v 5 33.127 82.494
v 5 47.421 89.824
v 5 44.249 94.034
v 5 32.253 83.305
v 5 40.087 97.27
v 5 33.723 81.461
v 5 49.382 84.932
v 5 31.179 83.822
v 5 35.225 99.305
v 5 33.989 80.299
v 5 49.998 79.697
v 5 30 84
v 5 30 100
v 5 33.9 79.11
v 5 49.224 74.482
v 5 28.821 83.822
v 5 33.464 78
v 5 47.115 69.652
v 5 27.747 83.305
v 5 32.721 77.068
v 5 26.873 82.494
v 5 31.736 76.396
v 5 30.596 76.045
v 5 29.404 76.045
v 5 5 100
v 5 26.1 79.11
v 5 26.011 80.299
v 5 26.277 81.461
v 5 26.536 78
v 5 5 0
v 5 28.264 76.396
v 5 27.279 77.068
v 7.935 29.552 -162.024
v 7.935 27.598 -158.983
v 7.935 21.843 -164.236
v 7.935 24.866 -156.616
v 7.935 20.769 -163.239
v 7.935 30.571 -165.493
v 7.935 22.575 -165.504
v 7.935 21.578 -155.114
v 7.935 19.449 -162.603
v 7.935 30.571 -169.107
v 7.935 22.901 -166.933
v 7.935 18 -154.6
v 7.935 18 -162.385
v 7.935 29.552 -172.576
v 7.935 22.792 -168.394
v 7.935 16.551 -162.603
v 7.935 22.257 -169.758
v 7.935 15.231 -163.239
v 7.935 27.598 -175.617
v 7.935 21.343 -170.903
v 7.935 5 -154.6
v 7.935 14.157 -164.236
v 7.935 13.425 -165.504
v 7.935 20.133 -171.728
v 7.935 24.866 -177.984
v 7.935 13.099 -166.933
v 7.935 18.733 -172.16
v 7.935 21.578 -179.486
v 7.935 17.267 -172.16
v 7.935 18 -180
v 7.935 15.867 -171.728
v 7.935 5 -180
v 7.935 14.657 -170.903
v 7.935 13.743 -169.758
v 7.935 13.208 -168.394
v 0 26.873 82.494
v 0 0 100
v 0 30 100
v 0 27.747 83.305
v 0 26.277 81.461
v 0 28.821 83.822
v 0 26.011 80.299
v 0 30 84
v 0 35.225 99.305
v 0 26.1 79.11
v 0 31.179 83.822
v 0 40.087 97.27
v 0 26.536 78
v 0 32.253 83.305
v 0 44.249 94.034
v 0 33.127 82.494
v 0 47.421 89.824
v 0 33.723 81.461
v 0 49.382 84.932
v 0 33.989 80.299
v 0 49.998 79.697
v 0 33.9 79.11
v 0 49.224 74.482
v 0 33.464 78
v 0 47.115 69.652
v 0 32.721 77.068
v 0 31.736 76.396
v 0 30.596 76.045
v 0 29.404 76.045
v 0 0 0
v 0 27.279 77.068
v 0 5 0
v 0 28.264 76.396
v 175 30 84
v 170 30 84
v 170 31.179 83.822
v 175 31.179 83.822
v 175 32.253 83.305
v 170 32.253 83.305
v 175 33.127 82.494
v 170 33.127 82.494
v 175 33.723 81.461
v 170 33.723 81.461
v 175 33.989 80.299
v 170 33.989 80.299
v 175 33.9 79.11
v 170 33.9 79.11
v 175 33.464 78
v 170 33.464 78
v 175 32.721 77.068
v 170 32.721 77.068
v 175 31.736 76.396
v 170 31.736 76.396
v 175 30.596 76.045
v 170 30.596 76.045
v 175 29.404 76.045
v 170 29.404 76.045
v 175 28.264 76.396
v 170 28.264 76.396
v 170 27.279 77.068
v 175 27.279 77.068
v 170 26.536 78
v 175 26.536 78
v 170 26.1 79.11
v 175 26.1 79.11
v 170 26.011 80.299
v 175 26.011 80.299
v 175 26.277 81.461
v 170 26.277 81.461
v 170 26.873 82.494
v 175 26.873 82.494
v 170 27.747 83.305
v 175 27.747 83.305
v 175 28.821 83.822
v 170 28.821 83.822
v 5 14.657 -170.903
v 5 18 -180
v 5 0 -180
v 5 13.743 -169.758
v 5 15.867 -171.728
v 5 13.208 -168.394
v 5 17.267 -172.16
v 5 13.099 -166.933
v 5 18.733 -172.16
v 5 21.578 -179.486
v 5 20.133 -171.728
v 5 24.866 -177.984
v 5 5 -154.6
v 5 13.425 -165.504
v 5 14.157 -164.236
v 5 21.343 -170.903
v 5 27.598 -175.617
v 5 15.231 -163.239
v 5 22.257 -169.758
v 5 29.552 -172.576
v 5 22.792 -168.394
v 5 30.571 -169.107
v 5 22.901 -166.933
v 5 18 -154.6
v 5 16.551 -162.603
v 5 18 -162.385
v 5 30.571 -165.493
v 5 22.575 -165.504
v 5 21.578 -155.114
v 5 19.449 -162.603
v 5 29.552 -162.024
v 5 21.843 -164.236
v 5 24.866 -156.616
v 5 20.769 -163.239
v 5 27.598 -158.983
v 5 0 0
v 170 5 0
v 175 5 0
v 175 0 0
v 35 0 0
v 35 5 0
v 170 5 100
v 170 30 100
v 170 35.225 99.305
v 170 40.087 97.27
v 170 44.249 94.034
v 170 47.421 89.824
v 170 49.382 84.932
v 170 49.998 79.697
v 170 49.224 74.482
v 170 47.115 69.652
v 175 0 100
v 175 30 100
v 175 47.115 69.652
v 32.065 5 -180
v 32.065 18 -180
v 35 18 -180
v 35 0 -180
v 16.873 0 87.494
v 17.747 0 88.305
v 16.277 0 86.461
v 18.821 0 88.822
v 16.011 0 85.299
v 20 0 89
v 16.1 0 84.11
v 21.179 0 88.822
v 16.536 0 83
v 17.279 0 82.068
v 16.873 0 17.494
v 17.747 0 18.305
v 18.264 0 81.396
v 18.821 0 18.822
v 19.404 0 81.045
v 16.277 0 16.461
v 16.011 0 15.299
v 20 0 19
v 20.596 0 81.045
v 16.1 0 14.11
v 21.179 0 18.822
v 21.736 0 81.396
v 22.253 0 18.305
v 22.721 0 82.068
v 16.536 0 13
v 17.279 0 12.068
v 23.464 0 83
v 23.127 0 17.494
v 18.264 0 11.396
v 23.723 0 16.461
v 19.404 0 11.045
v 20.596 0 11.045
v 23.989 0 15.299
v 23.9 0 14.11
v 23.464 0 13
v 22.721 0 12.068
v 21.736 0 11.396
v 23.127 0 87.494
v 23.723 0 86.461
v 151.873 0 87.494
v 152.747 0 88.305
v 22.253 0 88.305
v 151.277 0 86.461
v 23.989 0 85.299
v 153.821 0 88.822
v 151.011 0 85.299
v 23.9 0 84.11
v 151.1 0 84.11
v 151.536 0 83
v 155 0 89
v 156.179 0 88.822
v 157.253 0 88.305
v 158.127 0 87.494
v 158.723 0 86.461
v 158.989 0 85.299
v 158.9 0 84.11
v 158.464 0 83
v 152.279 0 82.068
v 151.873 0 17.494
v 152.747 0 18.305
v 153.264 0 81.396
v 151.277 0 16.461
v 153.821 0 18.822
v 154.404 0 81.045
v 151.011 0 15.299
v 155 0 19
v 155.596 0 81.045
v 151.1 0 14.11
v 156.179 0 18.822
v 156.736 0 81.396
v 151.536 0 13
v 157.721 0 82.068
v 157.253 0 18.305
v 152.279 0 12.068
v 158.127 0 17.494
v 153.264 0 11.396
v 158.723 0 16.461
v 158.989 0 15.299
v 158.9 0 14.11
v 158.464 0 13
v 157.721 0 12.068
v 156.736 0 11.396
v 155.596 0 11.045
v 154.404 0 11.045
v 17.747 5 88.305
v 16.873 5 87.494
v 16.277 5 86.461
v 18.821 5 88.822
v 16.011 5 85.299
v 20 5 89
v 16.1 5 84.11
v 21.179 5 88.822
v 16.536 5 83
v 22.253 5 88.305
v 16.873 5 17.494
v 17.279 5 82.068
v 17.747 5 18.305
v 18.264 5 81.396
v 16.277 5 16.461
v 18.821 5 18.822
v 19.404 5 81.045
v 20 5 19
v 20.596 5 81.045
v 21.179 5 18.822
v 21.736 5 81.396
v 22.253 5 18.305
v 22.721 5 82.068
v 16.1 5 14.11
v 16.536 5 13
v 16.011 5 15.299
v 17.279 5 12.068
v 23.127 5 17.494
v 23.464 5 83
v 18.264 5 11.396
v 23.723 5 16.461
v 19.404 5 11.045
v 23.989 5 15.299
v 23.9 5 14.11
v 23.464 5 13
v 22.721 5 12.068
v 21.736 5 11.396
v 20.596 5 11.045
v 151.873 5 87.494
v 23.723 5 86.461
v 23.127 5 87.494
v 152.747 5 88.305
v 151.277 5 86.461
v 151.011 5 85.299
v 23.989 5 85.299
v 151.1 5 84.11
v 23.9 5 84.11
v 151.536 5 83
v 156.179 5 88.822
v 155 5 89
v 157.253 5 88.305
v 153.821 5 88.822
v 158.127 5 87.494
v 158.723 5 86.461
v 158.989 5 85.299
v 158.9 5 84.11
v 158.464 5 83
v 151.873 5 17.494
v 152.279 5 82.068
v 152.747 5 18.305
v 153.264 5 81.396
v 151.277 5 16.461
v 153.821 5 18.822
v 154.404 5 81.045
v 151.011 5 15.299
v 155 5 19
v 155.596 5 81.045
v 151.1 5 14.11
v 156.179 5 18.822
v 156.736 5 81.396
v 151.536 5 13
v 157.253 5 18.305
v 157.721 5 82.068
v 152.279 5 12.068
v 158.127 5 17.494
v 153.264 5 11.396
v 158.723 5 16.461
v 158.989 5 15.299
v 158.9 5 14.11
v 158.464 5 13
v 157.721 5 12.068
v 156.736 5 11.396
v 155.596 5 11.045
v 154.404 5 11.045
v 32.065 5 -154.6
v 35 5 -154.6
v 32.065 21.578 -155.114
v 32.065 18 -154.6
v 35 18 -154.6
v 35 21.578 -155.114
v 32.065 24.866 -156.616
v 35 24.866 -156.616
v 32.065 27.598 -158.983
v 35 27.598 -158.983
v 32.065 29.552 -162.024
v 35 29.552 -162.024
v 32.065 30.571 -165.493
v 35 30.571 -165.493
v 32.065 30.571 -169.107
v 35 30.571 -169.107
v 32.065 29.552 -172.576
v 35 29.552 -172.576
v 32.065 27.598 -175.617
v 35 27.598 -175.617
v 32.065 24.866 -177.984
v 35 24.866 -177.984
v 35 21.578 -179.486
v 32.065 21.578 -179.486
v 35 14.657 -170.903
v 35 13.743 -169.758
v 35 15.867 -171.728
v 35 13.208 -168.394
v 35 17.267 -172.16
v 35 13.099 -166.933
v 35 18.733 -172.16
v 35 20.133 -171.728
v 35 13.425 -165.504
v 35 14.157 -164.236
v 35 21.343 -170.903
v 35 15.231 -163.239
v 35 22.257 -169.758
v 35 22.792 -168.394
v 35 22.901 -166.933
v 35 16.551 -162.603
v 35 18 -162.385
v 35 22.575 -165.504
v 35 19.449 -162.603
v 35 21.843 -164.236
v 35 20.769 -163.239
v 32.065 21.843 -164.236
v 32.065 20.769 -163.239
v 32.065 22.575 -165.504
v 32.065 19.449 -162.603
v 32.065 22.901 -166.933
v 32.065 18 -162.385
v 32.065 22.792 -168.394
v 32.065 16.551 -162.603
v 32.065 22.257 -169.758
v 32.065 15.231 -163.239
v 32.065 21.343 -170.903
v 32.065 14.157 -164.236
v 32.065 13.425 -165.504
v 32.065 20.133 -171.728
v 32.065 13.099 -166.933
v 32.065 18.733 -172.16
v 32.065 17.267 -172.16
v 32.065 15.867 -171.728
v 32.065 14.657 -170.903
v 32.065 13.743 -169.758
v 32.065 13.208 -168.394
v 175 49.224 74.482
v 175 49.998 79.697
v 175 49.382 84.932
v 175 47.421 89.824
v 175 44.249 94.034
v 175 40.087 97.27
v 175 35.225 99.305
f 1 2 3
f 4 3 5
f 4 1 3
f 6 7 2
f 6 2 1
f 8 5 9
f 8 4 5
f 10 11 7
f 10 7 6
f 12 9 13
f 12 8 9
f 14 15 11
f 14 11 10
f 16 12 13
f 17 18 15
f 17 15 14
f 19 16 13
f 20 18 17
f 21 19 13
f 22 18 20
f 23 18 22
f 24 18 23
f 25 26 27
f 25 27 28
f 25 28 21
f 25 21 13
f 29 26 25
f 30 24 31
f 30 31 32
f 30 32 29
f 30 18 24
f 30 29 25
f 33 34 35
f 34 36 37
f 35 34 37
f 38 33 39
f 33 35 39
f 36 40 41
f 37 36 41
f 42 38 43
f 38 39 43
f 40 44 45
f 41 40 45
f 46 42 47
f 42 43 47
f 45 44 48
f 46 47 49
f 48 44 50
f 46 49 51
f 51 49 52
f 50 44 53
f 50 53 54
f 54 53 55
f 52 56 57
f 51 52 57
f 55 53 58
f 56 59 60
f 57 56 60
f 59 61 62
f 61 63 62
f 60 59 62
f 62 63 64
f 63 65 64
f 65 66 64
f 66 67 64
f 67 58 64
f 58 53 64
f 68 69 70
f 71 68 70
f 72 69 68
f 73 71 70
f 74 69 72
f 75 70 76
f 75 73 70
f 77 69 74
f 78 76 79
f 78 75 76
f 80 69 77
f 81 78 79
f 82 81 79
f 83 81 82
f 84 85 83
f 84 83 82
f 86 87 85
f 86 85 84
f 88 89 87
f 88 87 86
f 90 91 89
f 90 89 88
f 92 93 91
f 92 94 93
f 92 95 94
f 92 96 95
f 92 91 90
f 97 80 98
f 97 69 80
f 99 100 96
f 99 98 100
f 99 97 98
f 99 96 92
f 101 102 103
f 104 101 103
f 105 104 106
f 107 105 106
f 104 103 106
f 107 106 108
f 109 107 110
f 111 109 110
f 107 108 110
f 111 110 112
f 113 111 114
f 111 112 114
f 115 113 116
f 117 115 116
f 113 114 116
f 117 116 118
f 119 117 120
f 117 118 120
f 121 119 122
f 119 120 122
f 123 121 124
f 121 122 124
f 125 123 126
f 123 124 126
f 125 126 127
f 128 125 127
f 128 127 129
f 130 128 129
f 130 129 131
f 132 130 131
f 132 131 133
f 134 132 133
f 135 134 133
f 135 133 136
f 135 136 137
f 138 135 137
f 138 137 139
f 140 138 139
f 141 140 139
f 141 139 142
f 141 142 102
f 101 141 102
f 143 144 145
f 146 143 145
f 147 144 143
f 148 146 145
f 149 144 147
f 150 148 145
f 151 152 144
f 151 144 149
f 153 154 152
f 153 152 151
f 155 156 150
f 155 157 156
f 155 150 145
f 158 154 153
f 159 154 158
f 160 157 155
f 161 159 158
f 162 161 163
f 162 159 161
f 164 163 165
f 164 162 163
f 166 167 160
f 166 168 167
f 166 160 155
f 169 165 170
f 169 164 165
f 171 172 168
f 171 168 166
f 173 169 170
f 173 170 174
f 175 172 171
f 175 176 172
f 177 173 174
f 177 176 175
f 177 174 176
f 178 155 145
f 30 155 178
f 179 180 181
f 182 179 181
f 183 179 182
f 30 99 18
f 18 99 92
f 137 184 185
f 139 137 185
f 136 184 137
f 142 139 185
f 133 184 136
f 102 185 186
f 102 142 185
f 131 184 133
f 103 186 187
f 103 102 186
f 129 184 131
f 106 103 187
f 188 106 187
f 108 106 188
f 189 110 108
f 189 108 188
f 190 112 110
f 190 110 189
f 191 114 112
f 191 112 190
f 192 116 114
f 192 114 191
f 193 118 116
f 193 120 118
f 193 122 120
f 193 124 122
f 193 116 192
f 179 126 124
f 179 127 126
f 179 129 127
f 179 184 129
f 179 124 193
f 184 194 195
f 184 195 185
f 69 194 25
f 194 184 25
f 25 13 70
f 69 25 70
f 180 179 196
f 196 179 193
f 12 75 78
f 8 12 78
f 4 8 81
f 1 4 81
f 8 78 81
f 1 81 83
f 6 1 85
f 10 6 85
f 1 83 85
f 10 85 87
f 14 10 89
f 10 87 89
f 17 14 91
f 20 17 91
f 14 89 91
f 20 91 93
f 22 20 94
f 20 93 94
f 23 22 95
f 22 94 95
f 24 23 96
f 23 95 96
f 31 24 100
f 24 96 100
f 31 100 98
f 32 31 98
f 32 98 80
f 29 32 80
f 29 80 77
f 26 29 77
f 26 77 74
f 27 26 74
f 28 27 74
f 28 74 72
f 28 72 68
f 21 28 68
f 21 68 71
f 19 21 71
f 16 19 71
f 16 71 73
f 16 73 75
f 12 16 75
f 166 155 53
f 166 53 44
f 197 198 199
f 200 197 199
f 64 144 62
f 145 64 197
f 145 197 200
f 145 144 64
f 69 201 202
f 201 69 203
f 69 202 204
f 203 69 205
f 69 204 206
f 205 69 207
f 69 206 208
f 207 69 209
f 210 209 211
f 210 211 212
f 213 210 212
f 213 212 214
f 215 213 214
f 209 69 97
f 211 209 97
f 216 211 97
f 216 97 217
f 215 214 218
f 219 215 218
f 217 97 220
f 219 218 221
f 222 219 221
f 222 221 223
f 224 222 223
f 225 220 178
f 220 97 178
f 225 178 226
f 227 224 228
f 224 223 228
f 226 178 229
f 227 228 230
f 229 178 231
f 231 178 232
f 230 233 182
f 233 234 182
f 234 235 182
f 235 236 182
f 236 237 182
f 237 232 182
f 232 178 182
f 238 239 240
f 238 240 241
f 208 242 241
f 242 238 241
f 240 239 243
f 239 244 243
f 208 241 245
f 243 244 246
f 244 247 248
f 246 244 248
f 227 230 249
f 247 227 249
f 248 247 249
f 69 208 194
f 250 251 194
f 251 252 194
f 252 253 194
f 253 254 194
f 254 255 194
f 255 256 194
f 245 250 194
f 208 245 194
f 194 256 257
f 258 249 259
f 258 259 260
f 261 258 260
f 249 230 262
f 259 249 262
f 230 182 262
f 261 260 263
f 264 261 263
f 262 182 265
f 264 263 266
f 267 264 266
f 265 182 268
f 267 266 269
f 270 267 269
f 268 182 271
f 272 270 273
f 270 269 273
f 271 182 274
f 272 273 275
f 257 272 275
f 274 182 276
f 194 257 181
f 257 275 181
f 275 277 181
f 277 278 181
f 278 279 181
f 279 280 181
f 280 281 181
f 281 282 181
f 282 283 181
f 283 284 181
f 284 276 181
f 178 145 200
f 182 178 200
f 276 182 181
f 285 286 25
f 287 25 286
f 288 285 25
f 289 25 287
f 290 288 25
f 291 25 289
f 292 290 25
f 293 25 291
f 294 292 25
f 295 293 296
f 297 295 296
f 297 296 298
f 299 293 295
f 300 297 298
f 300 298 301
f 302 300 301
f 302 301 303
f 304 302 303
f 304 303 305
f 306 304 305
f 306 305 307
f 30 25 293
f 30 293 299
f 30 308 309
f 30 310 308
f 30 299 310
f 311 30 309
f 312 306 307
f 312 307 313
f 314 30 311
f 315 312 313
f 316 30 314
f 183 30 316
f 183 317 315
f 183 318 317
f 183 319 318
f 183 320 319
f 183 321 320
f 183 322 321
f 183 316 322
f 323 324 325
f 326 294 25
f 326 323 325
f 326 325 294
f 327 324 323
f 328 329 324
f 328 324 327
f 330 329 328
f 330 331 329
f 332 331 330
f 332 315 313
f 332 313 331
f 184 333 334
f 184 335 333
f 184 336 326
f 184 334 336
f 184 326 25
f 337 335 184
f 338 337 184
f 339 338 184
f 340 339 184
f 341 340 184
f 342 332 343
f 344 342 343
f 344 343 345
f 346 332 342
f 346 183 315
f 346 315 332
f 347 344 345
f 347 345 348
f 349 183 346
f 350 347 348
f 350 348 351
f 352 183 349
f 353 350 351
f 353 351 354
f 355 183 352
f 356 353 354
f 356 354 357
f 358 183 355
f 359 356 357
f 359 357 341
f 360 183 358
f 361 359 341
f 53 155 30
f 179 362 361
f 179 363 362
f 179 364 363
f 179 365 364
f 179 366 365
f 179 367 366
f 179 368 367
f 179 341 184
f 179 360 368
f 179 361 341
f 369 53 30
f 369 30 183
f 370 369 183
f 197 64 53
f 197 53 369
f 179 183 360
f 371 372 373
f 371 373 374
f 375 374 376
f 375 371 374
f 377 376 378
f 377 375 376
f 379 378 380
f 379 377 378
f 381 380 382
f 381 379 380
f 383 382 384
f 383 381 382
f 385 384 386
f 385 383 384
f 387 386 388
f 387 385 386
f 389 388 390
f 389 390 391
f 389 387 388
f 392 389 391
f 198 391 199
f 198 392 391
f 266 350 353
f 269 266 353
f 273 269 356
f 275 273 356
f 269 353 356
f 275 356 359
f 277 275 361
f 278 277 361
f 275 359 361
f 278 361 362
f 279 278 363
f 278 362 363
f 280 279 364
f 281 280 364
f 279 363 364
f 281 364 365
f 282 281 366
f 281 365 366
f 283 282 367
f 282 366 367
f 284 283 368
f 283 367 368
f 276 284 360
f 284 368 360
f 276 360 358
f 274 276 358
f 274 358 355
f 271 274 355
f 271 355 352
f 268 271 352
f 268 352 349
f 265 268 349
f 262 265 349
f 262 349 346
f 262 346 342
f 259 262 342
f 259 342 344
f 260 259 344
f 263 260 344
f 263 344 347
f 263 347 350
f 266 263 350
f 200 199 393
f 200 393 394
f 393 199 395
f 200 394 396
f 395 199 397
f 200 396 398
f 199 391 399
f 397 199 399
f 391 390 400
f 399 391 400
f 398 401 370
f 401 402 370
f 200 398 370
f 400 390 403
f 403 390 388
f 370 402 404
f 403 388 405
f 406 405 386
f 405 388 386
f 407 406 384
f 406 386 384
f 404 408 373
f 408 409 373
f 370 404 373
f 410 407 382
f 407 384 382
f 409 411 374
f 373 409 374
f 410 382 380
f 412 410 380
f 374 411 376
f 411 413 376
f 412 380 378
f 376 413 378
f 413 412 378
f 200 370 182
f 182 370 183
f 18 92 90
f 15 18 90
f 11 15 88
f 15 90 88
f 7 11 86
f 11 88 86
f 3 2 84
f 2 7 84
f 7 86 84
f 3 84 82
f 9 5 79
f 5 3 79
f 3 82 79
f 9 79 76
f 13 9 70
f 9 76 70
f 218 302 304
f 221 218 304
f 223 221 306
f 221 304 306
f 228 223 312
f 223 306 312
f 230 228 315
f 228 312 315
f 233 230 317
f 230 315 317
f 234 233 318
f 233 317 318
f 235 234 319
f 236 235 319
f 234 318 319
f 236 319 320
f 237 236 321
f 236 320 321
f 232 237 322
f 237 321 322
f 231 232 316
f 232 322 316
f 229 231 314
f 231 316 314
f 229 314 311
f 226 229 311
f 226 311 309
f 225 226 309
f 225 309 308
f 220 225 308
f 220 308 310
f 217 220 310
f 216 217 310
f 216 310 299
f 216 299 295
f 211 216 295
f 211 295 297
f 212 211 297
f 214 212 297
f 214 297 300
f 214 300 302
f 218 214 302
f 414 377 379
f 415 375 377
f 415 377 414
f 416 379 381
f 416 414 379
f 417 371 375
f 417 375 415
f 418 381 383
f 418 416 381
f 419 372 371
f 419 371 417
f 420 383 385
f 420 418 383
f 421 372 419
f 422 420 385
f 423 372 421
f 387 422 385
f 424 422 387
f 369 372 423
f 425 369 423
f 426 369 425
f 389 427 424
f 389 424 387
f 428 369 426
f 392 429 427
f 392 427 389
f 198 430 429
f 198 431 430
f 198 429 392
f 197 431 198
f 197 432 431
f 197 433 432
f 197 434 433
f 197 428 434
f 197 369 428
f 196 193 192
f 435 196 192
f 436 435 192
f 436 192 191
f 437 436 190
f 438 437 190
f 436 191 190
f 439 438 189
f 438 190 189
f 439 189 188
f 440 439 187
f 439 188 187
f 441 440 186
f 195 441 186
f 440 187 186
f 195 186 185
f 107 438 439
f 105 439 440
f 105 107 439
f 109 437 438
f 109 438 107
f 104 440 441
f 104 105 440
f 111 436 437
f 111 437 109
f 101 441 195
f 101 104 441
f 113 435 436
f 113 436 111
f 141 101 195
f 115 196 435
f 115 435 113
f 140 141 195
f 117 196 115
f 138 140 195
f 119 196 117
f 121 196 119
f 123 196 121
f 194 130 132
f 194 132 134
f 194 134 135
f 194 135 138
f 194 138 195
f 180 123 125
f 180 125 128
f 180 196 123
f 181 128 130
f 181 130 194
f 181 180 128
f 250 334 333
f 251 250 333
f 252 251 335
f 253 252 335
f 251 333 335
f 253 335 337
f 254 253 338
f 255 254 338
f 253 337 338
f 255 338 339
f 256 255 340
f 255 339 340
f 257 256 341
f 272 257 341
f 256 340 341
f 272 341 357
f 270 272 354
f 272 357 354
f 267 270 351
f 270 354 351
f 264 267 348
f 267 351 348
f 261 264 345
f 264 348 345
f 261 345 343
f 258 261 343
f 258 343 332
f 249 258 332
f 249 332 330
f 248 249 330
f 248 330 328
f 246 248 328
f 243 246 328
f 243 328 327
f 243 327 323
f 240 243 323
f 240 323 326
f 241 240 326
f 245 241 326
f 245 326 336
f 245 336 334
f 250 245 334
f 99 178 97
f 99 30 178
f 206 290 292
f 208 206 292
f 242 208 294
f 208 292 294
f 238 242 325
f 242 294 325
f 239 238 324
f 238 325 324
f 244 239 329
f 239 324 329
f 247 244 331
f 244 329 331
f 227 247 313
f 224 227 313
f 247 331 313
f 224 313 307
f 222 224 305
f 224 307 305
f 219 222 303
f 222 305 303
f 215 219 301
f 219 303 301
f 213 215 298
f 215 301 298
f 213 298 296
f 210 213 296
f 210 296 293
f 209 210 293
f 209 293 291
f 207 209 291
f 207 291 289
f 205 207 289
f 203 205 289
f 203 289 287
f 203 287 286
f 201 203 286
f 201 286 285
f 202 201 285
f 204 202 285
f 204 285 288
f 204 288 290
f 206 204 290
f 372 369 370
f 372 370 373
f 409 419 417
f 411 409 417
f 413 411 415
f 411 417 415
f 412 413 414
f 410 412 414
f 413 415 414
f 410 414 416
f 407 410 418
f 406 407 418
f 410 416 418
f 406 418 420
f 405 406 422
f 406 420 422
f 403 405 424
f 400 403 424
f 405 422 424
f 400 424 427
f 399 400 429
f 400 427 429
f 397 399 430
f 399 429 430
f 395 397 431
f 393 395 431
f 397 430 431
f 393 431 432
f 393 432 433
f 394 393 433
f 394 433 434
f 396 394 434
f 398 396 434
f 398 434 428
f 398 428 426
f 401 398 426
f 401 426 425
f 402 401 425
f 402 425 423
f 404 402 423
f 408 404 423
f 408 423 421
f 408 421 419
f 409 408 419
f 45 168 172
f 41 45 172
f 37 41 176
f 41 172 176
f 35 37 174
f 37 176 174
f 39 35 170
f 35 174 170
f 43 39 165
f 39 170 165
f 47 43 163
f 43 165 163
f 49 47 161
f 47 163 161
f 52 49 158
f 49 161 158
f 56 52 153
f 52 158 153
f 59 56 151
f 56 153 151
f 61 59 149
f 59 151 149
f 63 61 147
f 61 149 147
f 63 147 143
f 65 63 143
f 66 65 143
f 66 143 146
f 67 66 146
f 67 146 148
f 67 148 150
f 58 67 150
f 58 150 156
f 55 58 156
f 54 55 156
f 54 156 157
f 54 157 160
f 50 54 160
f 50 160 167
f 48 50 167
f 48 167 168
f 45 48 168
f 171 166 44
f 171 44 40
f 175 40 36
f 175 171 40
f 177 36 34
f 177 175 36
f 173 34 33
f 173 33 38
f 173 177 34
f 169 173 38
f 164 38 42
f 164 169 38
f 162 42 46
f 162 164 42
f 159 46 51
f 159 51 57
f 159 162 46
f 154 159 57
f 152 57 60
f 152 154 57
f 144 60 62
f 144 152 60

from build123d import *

# Parameters (mm, degrees)
BOSS_EXTRUDE1_DEPTH = 100
SKETCH2_R           = 4
CUT_EXTRUDE1_DEPTH  = 208.665596573
SKETCH3_R           = 4
CUT_EXTRUDE2_DEPTH  = 207.518764281
SKETCH4_W           = 30
SKETCH4_H           = 180
BOSS_EXTRUDE2_DEPTH = 5
SKETCH5_R           = 4.915
BOSS_EXTRUDE3_DEPTH = 30
SKETCH6_W           = 24.13
SKETCH6_H           = 109.462544294
CUT_EXTRUDE3_DEPTH  = 256.049014897


with BuildPart() as part:
    # Sketch1 → Boss-Extrude1 (new body)
    with BuildSketch(Plane.XY):
        Polygon((0, 50), (5, 50), (5, 5), (170, 5), (170, 50), (175, 50), (175, 0), (0, 0), align=None)
    extrude(amount=BOSS_EXTRUDE1_DEPTH)

    # Sketch2 → Cut-Extrude1 (cut, through all)
    with BuildSketch(Plane.ZY):
        with Locations((80, 30)):
            Circle(SKETCH2_R)
        with BuildLine():
            Line((100, 30), (100, 5))
            Line((100, 5), (131.663980624, 33.697237635))
            Line((131.663980624, 33.697237635), (100, 64.741873333))
            Line((100, 64.741873333), (-14.790865649, 55.926144723))
            Line((-14.790865649, 55.926144723), (0, 5))
            Line((0, 5), (69.651665268, 47.114671141))
            ThreePointArc((69.651665268, 47.114671141), (89.824288915, 47.420773442), (100, 30))
        make_face()
    extrude(amount=-CUT_EXTRUDE1_DEPTH, mode=Mode.SUBTRACT)

    # Sketch3 → Cut-Extrude2 (cut, through all)
    with BuildSketch(Plane(origin=(0, 5, 0), x_dir=(1, 0, 0), z_dir=(0, 1, 0))):
        with Locations(Location((20, -15, 0), (0, 0, 270))):
            Circle(SKETCH3_R)
        with Locations(Location((155, -15, 0), (0, 0, 270))):
            Circle(SKETCH3_R)
        with Locations(Location((155, -85, 0), (0, 0, 270))):
            Circle(SKETCH3_R)
        with Locations(Location((20, -85, 0), (0, 0, 270))):
            Circle(SKETCH3_R)
    extrude(amount=-CUT_EXTRUDE2_DEPTH, mode=Mode.SUBTRACT)

    # Sketch4 → Boss-Extrude2 (add)
    with BuildSketch(Plane(origin=(0, 5, 0), x_dir=(1, 0, 0), z_dir=(0, 1, 0))):
        with Locations((20, 90)):
            Rectangle(SKETCH4_W, SKETCH4_H)
    extrude(amount=-BOSS_EXTRUDE2_DEPTH)

    # Sketch5 → Boss-Extrude3 (add)
    with BuildSketch(Plane.ZY.offset(-5)):
        with BuildLine():
            Line((-180, 18), (-180, 5))
            Line((-180, 5), (-154.6, 5))
            Line((-154.6, 5), (-154.6, 18))
            ThreePointArc((-154.6, 18), (-167.3, 30.7), (-180, 18))
        make_face()
        with Locations((-167.3, 18)):
            Circle(SKETCH5_R, mode=Mode.SUBTRACT)
    extrude(amount=-BOSS_EXTRUDE3_DEPTH)

    # Sketch6 → Cut-Extrude3 (cut, through all)
    with BuildSketch(Plane(origin=(0, 5, 0), x_dir=(1, 0, 0), z_dir=(0, 1, 0))):
        with Locations((20, 162.88766727)):
            Rectangle(SKETCH6_W, SKETCH6_H)
    extrude(amount=CUT_EXTRUDE3_DEPTH, mode=Mode.SUBTRACT)


solid = part.part
